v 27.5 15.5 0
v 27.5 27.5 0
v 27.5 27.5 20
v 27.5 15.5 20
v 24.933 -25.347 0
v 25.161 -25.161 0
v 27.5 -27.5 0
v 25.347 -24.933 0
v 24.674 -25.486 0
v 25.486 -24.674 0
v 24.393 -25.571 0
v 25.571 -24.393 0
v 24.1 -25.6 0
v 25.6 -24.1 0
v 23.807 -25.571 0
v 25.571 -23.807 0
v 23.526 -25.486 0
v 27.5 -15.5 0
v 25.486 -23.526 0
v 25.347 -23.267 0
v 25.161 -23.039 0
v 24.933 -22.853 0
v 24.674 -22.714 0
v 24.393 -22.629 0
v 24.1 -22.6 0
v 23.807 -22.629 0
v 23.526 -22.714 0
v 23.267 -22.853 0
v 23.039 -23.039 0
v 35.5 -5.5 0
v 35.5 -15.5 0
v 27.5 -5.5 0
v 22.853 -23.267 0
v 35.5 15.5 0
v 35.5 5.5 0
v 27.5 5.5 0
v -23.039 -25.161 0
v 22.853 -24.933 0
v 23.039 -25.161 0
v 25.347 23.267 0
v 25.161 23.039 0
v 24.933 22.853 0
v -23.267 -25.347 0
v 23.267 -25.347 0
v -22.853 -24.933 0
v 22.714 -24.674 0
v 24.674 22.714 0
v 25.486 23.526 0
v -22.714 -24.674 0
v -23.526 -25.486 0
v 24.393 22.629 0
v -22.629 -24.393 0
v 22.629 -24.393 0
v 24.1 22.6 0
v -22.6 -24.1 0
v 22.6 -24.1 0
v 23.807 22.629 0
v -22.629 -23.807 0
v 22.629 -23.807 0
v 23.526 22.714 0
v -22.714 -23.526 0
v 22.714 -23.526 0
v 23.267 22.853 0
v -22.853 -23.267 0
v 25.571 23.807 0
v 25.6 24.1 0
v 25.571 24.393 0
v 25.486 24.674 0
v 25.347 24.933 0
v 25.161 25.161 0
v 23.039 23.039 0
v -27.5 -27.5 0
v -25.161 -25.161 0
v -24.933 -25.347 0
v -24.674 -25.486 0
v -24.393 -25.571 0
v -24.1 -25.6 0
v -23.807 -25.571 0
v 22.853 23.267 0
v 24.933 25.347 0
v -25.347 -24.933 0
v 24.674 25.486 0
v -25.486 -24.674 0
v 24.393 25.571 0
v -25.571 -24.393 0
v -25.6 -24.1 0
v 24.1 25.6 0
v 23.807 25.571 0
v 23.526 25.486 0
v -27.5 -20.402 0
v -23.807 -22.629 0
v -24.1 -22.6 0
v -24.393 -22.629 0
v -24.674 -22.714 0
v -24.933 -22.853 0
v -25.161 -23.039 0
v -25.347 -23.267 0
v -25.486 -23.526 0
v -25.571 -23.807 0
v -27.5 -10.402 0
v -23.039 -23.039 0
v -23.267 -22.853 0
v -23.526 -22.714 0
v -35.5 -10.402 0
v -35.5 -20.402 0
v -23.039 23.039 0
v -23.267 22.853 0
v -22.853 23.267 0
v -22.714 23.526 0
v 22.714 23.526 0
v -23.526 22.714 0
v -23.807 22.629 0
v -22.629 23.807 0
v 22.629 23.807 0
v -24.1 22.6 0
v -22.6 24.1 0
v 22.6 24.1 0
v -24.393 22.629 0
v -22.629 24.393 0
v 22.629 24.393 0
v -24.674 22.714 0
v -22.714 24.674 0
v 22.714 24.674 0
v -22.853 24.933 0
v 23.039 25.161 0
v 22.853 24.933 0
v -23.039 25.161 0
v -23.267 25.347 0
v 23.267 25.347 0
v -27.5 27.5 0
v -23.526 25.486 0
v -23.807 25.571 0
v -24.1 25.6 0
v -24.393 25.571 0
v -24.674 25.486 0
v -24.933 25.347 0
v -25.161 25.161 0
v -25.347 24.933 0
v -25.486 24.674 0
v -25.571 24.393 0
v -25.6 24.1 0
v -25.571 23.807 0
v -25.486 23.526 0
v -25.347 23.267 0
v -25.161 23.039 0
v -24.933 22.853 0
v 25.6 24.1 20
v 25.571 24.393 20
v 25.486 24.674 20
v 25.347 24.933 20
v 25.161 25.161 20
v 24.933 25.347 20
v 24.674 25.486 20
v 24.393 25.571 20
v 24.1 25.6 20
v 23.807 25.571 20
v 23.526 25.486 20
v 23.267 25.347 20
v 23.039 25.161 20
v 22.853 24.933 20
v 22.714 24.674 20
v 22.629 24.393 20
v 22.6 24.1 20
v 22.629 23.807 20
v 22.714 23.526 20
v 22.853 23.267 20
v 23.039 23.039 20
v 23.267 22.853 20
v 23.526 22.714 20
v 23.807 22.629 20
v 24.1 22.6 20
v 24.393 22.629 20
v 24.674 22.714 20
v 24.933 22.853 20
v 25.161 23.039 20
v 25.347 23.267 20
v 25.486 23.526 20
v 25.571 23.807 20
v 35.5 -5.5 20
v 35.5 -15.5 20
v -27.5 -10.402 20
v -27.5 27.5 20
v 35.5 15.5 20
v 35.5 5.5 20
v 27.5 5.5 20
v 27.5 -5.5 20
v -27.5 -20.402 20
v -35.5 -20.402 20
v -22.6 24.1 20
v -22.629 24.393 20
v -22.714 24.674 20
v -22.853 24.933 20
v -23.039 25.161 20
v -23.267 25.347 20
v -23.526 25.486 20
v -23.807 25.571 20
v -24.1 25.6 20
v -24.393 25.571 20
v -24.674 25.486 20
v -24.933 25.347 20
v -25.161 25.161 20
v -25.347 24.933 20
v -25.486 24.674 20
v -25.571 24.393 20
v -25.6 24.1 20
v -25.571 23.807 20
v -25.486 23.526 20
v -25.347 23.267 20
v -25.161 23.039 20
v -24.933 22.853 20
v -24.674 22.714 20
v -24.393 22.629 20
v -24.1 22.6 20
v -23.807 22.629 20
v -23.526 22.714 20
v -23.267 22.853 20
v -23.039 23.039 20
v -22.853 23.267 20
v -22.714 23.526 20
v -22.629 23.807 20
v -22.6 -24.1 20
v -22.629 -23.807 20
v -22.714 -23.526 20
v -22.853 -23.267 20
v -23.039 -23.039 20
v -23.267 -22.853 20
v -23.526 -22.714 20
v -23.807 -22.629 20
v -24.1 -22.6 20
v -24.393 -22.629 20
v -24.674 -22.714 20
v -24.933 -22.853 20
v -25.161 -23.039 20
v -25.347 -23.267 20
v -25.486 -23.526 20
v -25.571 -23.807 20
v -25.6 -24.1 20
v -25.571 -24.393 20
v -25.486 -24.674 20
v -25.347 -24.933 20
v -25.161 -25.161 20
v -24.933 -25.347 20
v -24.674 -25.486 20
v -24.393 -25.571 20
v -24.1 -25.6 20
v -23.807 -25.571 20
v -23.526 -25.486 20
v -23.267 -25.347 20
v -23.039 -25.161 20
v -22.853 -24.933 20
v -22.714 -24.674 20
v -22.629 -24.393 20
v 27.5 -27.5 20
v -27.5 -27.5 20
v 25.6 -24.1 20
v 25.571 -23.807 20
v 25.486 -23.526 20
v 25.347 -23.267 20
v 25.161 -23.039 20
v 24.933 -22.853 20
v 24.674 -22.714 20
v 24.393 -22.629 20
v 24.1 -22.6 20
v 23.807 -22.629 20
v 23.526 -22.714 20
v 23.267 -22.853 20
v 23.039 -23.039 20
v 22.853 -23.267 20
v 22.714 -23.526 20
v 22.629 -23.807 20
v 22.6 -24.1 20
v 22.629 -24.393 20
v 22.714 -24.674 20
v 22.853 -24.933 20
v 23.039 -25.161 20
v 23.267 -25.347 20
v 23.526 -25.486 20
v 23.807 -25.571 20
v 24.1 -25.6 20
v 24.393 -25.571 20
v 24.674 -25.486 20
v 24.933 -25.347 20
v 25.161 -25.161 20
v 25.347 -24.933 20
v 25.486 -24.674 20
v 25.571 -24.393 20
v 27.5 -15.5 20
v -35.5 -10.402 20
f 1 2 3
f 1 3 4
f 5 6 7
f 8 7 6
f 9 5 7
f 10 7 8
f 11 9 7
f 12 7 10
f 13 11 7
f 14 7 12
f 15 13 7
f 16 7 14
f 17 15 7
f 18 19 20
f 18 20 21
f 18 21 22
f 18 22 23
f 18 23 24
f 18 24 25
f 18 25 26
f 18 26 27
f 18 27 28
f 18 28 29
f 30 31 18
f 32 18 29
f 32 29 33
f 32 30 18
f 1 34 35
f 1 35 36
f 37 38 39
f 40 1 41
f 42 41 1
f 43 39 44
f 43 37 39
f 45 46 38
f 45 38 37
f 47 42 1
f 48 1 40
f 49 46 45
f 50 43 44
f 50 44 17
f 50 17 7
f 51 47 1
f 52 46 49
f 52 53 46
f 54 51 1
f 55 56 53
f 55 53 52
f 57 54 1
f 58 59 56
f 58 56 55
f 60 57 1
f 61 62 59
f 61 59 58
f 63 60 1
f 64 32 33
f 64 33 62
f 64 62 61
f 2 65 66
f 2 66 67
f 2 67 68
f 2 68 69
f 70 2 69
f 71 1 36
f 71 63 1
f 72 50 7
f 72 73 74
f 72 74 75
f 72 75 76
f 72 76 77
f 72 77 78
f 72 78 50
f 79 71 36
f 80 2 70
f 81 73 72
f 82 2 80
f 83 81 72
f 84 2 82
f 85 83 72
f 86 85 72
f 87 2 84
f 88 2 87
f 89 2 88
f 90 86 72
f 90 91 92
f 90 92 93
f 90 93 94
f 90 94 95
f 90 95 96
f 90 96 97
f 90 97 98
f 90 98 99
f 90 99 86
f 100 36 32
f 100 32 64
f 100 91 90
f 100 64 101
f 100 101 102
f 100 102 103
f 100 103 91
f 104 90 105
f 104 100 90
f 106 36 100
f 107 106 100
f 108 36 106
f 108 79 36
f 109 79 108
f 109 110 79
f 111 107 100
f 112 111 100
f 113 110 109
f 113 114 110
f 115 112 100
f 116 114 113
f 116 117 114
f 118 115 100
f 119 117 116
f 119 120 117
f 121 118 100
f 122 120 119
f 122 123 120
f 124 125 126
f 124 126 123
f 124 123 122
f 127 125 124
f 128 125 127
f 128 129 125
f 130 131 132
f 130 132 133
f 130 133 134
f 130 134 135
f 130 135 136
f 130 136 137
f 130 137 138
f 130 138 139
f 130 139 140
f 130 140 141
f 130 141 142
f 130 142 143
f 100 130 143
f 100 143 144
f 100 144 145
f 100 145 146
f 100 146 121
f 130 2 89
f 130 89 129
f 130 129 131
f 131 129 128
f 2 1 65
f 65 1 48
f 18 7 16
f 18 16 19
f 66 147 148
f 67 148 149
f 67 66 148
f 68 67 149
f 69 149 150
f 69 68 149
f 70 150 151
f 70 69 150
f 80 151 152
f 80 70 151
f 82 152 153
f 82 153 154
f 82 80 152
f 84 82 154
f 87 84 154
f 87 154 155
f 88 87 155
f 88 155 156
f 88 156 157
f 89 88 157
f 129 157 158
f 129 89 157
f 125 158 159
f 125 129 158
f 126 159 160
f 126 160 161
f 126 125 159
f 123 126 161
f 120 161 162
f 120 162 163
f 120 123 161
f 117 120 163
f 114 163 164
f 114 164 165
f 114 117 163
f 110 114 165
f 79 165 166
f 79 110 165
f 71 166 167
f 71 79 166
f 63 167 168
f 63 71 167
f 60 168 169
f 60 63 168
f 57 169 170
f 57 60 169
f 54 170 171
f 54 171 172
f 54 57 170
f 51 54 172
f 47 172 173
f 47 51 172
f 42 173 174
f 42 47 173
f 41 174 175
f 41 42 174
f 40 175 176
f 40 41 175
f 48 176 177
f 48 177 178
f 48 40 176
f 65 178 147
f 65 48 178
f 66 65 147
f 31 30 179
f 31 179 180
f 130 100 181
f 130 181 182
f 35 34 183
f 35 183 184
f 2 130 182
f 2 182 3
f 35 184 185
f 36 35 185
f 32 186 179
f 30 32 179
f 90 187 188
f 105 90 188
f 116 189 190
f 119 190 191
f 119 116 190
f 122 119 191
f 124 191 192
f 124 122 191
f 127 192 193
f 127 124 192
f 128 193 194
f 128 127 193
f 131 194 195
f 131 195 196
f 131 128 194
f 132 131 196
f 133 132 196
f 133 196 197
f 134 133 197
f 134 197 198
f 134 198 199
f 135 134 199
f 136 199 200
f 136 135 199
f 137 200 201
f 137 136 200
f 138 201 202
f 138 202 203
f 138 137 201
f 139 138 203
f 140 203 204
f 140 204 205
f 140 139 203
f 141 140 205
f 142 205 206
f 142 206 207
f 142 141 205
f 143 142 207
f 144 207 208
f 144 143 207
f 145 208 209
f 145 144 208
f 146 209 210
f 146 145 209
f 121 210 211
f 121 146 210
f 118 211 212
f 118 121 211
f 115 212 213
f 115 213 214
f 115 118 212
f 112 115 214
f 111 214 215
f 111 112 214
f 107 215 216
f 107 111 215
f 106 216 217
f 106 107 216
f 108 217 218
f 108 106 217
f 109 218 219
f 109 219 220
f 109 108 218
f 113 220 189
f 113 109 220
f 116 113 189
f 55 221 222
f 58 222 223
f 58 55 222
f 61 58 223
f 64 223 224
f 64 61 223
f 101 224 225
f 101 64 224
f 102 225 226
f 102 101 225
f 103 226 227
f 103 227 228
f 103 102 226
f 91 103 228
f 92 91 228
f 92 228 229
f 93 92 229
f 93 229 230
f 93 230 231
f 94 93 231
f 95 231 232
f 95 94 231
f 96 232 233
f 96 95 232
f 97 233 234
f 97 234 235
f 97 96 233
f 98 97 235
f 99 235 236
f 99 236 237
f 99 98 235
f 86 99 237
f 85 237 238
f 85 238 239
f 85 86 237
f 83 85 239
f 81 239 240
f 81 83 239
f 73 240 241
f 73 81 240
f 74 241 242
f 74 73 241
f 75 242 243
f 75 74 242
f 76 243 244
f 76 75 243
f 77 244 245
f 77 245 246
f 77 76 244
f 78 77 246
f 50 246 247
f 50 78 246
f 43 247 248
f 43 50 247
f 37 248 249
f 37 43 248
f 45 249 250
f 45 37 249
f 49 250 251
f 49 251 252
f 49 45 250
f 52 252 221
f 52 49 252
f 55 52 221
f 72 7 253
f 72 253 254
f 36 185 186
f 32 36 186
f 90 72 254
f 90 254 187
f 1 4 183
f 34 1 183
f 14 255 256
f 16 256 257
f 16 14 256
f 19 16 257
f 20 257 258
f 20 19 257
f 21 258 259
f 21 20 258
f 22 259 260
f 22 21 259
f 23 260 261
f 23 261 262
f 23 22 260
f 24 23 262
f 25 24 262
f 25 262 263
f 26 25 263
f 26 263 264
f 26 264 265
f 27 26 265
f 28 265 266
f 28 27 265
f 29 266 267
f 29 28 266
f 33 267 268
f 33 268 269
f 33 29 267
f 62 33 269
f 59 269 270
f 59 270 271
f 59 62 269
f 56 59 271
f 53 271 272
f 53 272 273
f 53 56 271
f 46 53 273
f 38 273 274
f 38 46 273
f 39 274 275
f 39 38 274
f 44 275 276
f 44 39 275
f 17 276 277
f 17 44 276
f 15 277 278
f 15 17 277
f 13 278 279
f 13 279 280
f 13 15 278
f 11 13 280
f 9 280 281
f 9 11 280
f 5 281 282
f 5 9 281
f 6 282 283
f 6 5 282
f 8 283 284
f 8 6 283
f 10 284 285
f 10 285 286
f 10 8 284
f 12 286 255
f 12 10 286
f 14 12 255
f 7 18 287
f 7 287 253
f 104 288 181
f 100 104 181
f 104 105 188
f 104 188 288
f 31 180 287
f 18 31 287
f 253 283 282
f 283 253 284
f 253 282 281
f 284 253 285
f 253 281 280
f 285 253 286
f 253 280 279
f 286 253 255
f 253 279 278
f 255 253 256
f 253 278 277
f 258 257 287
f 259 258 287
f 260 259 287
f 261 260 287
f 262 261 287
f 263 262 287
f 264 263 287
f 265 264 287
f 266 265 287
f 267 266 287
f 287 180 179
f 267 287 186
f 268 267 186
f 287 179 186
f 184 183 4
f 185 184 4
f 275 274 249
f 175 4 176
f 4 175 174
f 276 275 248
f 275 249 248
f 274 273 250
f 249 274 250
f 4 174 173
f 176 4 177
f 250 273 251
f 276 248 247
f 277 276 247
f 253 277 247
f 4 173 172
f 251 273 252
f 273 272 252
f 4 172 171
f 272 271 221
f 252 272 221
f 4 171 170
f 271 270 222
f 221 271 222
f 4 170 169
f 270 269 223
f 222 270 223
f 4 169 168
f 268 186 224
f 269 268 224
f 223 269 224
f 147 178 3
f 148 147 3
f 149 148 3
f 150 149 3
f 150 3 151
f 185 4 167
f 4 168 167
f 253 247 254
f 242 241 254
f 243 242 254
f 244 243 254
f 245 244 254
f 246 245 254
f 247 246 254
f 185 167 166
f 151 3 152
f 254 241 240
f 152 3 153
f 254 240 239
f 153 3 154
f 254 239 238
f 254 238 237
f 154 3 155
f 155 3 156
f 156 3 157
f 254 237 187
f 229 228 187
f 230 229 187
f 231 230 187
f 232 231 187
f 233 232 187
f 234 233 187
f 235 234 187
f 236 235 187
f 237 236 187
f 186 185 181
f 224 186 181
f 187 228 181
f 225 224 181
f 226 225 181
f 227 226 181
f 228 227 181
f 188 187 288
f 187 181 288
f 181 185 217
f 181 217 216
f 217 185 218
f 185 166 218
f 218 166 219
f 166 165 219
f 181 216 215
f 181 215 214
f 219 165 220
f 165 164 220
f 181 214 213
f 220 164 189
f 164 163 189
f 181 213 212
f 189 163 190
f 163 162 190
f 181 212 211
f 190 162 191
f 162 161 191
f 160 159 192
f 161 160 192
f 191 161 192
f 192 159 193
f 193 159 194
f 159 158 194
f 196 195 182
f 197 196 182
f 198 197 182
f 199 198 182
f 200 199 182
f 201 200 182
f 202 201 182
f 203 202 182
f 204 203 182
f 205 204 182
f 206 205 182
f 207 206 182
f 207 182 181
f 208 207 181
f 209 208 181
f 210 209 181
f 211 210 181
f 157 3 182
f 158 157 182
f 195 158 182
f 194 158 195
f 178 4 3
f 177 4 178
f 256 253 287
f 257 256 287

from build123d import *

# Parameters (mm, degrees)
SKETCH_1_R      = 1.5
EXTRUDE_1_DEPTH = 20


with BuildPart() as part:
    # 草图1 → 凸台-拉伸1 (new body)
    with BuildSketch(Plane.XY):
        Polygon((-27.5, -20.402404897), (-35.5, -20.402404897), (-35.5, -10.402404897), (-27.5, -10.402404897), (-27.5, 27.5), (27.5, 27.5), (27.5, 15.5), (35.5, 15.5), (35.5, 5.5), (27.5, 5.5), (27.5, -5.5), (35.5, -5.5), (35.5, -15.5), (27.5, -15.5), (27.5, -27.5), (-27.5, -27.5), align=None)
        with Locations((-24.1, 24.1)):
            Circle(SKETCH_1_R, mode=Mode.SUBTRACT)
        with Locations((24.1, 24.1)):
            Circle(SKETCH_1_R, mode=Mode.SUBTRACT)
        with Locations((-24.1, -24.1)):
            Circle(SKETCH_1_R, mode=Mode.SUBTRACT)
        with Locations((24.1, -24.1)):
            Circle(SKETCH_1_R, mode=Mode.SUBTRACT)
    extrude(amount=EXTRUDE_1_DEPTH)


solid = part.part
